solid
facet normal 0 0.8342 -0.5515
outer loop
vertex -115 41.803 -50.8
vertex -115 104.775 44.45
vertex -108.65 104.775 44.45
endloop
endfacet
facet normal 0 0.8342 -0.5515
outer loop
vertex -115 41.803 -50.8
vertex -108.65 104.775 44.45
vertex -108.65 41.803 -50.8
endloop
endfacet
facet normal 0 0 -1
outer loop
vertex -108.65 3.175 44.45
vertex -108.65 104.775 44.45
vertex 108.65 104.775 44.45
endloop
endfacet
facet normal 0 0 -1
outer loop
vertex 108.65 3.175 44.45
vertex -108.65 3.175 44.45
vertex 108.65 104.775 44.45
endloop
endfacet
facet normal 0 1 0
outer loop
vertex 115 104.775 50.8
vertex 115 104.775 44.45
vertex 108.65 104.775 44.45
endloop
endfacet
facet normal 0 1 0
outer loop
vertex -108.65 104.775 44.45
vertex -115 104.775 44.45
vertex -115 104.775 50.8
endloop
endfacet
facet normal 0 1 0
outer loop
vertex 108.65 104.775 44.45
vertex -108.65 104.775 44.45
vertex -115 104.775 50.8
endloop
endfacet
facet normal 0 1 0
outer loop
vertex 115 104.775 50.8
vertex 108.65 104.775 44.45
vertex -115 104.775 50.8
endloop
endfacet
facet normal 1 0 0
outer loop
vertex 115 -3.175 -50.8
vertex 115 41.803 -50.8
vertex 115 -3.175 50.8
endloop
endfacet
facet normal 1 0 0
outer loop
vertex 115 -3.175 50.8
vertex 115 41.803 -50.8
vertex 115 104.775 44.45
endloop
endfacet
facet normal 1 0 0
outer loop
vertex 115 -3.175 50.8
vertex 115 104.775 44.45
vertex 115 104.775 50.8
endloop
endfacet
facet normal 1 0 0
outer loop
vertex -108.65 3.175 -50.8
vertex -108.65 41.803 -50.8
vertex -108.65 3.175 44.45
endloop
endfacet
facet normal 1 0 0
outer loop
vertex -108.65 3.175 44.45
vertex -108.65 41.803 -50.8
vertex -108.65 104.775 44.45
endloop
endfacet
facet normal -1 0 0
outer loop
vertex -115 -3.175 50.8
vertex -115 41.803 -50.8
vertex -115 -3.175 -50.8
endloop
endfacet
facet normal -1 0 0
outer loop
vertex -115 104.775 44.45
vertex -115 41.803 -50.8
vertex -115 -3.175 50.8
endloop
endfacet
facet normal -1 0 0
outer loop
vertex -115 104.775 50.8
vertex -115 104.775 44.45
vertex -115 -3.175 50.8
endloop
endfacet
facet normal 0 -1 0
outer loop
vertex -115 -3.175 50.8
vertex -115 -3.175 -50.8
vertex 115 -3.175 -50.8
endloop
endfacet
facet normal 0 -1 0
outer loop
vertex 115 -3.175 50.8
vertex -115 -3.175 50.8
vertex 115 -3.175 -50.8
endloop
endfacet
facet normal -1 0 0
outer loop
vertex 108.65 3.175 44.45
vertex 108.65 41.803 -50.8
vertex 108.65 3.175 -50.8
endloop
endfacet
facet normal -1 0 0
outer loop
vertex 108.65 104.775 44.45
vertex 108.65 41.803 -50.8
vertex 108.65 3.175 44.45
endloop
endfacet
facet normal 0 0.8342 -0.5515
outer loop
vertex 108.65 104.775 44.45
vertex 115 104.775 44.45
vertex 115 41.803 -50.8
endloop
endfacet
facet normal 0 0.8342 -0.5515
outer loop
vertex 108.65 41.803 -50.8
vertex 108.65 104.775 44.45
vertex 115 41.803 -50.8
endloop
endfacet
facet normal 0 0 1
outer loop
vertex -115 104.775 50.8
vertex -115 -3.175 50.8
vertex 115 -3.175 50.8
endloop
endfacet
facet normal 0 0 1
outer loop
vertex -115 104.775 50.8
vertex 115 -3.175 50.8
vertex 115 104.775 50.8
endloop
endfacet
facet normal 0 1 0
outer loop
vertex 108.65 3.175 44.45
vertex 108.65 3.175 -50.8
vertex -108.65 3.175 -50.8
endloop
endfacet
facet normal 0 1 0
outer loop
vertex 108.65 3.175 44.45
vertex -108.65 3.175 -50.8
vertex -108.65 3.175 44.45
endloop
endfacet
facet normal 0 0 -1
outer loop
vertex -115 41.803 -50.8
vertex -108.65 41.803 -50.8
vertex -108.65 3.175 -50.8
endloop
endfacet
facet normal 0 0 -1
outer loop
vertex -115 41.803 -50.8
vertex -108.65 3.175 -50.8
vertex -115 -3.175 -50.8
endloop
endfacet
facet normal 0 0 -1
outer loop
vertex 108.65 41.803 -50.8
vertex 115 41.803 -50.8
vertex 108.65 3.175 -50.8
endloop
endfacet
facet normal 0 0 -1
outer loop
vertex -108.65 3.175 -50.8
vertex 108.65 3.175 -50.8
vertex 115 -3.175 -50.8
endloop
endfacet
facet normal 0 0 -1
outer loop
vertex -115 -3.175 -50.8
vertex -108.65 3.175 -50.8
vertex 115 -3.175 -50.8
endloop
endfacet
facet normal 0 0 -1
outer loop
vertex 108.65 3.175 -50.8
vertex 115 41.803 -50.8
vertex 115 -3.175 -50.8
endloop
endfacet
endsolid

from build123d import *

# Parameters (mm, degrees)
BOSS_EXTRUDE1_DEPTH     = 115
SKETCH2_R               = 2.5
CUT_EXTRUDE1_DEPTH      = 171.92584101
CUT_EXTRUDE2_DEPTH      = 150.015569656
CUT_EXTRUDE2_DEPTH_BACK = 150.015569656
SKETCH4_R               = 3.3
SPLIT1_SURFACE_1_BACK   = 266.855
SPLIT1_SURFACE_1_DEPTH  = 533.71
SPLIT1_SURFACE_2_BACK   = 266.855
SPLIT1_SURFACE_2_DEPTH  = 533.71
SKETCH6_W               = 6.35
SKETCH6_H               = 21.6
BOSS_EXTRUDE2_DEPTH     = 230
DELETEFACE1_START       = -3.175
DELETEFACE1_OUTLINE_R   = 3.3
DELETEFACE1_DEPTH       = 6.35
DELETEFACE1_START_2     = 44.45
DELETEFACE1_2_OUTLINE_R = 2.5
DELETEFACE1_2_DEPTH     = 6.35
BOSS_EXTRUDE3_DEPTH     = 6.35


# Read off the part's stored shape, not the designer's step: DeleteFace1
with BuildPart() as part:
    # Sketch1 → Boss-Extrude1 (new, symmetric)
    with BuildSketch(Plane(origin=(0, 0, 0), x_dir=(0, 0, -1), z_dir=(1, 0, 0))):
        Polygon((-50.8, -3.175), (50.8, -3.175), (50.8, 3.175), (-44.45, 3.175), (-44.45, 83.175), (-50.8, 83.175), (-50.8, 3.175), align=None)
    extrude(amount=BOSS_EXTRUDE1_DEPTH, both=True)

    # Sketch2 → Cut-Extrude1 (cut, through all)
    with BuildSketch(Plane(origin=(0, 0, 44.45), x_dir=(-1, 0, 0), z_dir=(0, 0, -1))):
        with Locations(Location((-32.5, 73.491666667, 0), (0, 0, 90))):
            Circle(SKETCH2_R)
        with Locations(Location((-32.5, 11.825, 0), (0, 0, 90))):
            Circle(SKETCH2_R)
        with Locations(Location((32.5, 11.825, 0), (0, 0, 90))):
            Circle(SKETCH2_R)
        with Locations(Location((32.5, 73.491666667, 0), (0, 0, 90))):
            Circle(SKETCH2_R)
        with Locations(Location((-102.75, 73.491666667, 0), (0, 0, 90))):
            Circle(SKETCH2_R)
        with Locations(Location((-102.75, 11.825, 0), (0, 0, 90))):
            Circle(SKETCH2_R)
        with Locations(Location((102.75, 73.491666667, 0), (0, 0, 90))):
            Circle(SKETCH2_R)
        with Locations(Location((102.75, 11.825, 0), (0, 0, 90))):
            Circle(SKETCH2_R)
    extrude(amount=-CUT_EXTRUDE1_DEPTH, mode=Mode.SUBTRACT)

    # Sketch4 → Cut-Extrude2 (cut, two sides: drawn at the far end of the back side and taken through both)
    with BuildSketch(Plane(origin=(0, 3.175, 0), x_dir=(1, 0, 0), z_dir=(0, 1, 0)).offset(-CUT_EXTRUDE2_DEPTH_BACK)):
        with Locations(Location((56.37, 25.8, 0), (0, 0, 270))):
            Circle(SKETCH4_R)
        with Locations(Location((96.37, 25.8, 0), (0, 0, 270))):
            Circle(SKETCH4_R)
        with Locations(Location((96.37, -27.2, 0), (0, 0, 270))):
            Circle(SKETCH4_R)
        with Locations(Location((56.37, -27.2, 0), (0, 0, 270))):
            Circle(SKETCH4_R)
        with Locations(Location((-96.37, 25.8, 0), (0, 0, 90))):
            Circle(SKETCH4_R)
        with Locations(Location((-96.37, -27.2, 0), (0, 0, 90))):
            Circle(SKETCH4_R)
        with Locations(Location((-56.37, -27.2, 0), (0, 0, 90))):
            Circle(SKETCH4_R)
        with Locations(Location((-56.37, 25.8, 0), (0, 0, 90))):
            Circle(SKETCH4_R)
    extrude(amount=CUT_EXTRUDE2_DEPTH + CUT_EXTRUDE2_DEPTH_BACK, mode=Mode.SUBTRACT)


with BuildPart() as body_2:
    # Split1: the piece behind the surface
    add(part.part)
    # Split1 surface: a surface, the sketch's curves swept straight by 533.71 mm
    with BuildLine(Plane.ZY.offset(115).offset(-SPLIT1_SURFACE_1_BACK), mode=Mode.PRIVATE) as split1_surface_1_path:
        Line((44.45, 3.175), (50.8, 3.175))
    split1_surface_1 = Shell.extrude(split1_surface_1_path.wire(), (-1 * SPLIT1_SURFACE_1_DEPTH, 0 * SPLIT1_SURFACE_1_DEPTH, 0 * SPLIT1_SURFACE_1_DEPTH))
    split(bisect_by=split1_surface_1, keep=Keep.BOTTOM)


with BuildPart() as part_1:
    add(part.part)

    # Split1: split by a surface, the side it looks to stays
    # Split1 surface: a surface, the sketch's curves swept straight by 533.71 mm
    with BuildLine(Plane.ZY.offset(115).offset(-SPLIT1_SURFACE_2_BACK), mode=Mode.PRIVATE) as split1_surface_2_path:
        Line((44.45, 3.175), (50.8, 3.175))
    split1_surface_2 = Shell.extrude(split1_surface_2_path.wire(), (-1 * SPLIT1_SURFACE_2_DEPTH, 0 * SPLIT1_SURFACE_2_DEPTH, 0 * SPLIT1_SURFACE_2_DEPTH))
    split(bisect_by=split1_surface_2, keep=Keep.TOP)

    # Sketch6 → Boss-Extrude2 (add)
    with BuildSketch(Plane.ZY.offset(115)):
        with Locations((47.625, 93.975)):
            Rectangle(SKETCH6_W, SKETCH6_H)
    extrude(amount=-BOSS_EXTRUDE2_DEPTH)


with BuildPart() as body_2_1:
    add(body_2.part)

    # Combine1: union part
    add(part_1.part)

    # DeleteFace1 outline → DeleteFace1 (add)
    with BuildSketch(Plane(origin=(0, 0, 0), x_dir=(1, 0, 0), z_dir=(0, 1, 0)).offset(DELETEFACE1_START)):
        with Locations((56.37, 25.8)):
            Circle(DELETEFACE1_OUTLINE_R)
        with Locations((-56.37, 25.8)):
            Circle(DELETEFACE1_OUTLINE_R)
        with Locations((-56.37, -27.2)):
            Circle(DELETEFACE1_OUTLINE_R)
        with Locations((-96.37, -27.2)):
            Circle(DELETEFACE1_OUTLINE_R)
        with Locations((-96.37, 25.8)):
            Circle(DELETEFACE1_OUTLINE_R)
        with Locations((56.37, -27.2)):
            Circle(DELETEFACE1_OUTLINE_R)
        with Locations((96.37, -27.2)):
            Circle(DELETEFACE1_OUTLINE_R)
        with Locations((96.37, 25.8)):
            Circle(DELETEFACE1_OUTLINE_R)
    extrude(amount=DELETEFACE1_DEPTH)

    # DeleteFace1 2 outline → DeleteFace1 2 (add)
    with BuildSketch(Plane.XY.offset(DELETEFACE1_START_2)):
        with Locations((32.5, 11.825)):
            Circle(DELETEFACE1_2_OUTLINE_R)
        with Locations((-32.5, 11.825)):
            Circle(DELETEFACE1_2_OUTLINE_R)
        with Locations((-32.5, 73.491666667)):
            Circle(DELETEFACE1_2_OUTLINE_R)
        with Locations((102.75, 73.491666667)):
            Circle(DELETEFACE1_2_OUTLINE_R)
        with Locations((-102.75, 11.825)):
            Circle(DELETEFACE1_2_OUTLINE_R)
        with Locations((-102.75, 73.491666667)):
            Circle(DELETEFACE1_2_OUTLINE_R)
        with Locations((102.75, 11.825)):
            Circle(DELETEFACE1_2_OUTLINE_R)
        with Locations((32.5, 73.491666667)):
            Circle(DELETEFACE1_2_OUTLINE_R)
    extrude(amount=DELETEFACE1_2_DEPTH)

    # Sketch10 → Boss-Extrude3 (add)
    with BuildSketch(Plane.ZY.offset(115)):
        Polygon((44.45, 104.775), (-50.8, 41.802895791), (-50.8, 3.175), (44.45, 3.175), align=None)
    boss_extrude3 = extrude(amount=-BOSS_EXTRUDE3_DEPTH)

    # Mirror1: Boss-Extrude3 across plane
    add(boss_extrude3.mirror(Plane(origin=(0, 0, 0), x_dir=(0, 0, 1), z_dir=(1, 0, 0))))


solid = body_2_1.part
